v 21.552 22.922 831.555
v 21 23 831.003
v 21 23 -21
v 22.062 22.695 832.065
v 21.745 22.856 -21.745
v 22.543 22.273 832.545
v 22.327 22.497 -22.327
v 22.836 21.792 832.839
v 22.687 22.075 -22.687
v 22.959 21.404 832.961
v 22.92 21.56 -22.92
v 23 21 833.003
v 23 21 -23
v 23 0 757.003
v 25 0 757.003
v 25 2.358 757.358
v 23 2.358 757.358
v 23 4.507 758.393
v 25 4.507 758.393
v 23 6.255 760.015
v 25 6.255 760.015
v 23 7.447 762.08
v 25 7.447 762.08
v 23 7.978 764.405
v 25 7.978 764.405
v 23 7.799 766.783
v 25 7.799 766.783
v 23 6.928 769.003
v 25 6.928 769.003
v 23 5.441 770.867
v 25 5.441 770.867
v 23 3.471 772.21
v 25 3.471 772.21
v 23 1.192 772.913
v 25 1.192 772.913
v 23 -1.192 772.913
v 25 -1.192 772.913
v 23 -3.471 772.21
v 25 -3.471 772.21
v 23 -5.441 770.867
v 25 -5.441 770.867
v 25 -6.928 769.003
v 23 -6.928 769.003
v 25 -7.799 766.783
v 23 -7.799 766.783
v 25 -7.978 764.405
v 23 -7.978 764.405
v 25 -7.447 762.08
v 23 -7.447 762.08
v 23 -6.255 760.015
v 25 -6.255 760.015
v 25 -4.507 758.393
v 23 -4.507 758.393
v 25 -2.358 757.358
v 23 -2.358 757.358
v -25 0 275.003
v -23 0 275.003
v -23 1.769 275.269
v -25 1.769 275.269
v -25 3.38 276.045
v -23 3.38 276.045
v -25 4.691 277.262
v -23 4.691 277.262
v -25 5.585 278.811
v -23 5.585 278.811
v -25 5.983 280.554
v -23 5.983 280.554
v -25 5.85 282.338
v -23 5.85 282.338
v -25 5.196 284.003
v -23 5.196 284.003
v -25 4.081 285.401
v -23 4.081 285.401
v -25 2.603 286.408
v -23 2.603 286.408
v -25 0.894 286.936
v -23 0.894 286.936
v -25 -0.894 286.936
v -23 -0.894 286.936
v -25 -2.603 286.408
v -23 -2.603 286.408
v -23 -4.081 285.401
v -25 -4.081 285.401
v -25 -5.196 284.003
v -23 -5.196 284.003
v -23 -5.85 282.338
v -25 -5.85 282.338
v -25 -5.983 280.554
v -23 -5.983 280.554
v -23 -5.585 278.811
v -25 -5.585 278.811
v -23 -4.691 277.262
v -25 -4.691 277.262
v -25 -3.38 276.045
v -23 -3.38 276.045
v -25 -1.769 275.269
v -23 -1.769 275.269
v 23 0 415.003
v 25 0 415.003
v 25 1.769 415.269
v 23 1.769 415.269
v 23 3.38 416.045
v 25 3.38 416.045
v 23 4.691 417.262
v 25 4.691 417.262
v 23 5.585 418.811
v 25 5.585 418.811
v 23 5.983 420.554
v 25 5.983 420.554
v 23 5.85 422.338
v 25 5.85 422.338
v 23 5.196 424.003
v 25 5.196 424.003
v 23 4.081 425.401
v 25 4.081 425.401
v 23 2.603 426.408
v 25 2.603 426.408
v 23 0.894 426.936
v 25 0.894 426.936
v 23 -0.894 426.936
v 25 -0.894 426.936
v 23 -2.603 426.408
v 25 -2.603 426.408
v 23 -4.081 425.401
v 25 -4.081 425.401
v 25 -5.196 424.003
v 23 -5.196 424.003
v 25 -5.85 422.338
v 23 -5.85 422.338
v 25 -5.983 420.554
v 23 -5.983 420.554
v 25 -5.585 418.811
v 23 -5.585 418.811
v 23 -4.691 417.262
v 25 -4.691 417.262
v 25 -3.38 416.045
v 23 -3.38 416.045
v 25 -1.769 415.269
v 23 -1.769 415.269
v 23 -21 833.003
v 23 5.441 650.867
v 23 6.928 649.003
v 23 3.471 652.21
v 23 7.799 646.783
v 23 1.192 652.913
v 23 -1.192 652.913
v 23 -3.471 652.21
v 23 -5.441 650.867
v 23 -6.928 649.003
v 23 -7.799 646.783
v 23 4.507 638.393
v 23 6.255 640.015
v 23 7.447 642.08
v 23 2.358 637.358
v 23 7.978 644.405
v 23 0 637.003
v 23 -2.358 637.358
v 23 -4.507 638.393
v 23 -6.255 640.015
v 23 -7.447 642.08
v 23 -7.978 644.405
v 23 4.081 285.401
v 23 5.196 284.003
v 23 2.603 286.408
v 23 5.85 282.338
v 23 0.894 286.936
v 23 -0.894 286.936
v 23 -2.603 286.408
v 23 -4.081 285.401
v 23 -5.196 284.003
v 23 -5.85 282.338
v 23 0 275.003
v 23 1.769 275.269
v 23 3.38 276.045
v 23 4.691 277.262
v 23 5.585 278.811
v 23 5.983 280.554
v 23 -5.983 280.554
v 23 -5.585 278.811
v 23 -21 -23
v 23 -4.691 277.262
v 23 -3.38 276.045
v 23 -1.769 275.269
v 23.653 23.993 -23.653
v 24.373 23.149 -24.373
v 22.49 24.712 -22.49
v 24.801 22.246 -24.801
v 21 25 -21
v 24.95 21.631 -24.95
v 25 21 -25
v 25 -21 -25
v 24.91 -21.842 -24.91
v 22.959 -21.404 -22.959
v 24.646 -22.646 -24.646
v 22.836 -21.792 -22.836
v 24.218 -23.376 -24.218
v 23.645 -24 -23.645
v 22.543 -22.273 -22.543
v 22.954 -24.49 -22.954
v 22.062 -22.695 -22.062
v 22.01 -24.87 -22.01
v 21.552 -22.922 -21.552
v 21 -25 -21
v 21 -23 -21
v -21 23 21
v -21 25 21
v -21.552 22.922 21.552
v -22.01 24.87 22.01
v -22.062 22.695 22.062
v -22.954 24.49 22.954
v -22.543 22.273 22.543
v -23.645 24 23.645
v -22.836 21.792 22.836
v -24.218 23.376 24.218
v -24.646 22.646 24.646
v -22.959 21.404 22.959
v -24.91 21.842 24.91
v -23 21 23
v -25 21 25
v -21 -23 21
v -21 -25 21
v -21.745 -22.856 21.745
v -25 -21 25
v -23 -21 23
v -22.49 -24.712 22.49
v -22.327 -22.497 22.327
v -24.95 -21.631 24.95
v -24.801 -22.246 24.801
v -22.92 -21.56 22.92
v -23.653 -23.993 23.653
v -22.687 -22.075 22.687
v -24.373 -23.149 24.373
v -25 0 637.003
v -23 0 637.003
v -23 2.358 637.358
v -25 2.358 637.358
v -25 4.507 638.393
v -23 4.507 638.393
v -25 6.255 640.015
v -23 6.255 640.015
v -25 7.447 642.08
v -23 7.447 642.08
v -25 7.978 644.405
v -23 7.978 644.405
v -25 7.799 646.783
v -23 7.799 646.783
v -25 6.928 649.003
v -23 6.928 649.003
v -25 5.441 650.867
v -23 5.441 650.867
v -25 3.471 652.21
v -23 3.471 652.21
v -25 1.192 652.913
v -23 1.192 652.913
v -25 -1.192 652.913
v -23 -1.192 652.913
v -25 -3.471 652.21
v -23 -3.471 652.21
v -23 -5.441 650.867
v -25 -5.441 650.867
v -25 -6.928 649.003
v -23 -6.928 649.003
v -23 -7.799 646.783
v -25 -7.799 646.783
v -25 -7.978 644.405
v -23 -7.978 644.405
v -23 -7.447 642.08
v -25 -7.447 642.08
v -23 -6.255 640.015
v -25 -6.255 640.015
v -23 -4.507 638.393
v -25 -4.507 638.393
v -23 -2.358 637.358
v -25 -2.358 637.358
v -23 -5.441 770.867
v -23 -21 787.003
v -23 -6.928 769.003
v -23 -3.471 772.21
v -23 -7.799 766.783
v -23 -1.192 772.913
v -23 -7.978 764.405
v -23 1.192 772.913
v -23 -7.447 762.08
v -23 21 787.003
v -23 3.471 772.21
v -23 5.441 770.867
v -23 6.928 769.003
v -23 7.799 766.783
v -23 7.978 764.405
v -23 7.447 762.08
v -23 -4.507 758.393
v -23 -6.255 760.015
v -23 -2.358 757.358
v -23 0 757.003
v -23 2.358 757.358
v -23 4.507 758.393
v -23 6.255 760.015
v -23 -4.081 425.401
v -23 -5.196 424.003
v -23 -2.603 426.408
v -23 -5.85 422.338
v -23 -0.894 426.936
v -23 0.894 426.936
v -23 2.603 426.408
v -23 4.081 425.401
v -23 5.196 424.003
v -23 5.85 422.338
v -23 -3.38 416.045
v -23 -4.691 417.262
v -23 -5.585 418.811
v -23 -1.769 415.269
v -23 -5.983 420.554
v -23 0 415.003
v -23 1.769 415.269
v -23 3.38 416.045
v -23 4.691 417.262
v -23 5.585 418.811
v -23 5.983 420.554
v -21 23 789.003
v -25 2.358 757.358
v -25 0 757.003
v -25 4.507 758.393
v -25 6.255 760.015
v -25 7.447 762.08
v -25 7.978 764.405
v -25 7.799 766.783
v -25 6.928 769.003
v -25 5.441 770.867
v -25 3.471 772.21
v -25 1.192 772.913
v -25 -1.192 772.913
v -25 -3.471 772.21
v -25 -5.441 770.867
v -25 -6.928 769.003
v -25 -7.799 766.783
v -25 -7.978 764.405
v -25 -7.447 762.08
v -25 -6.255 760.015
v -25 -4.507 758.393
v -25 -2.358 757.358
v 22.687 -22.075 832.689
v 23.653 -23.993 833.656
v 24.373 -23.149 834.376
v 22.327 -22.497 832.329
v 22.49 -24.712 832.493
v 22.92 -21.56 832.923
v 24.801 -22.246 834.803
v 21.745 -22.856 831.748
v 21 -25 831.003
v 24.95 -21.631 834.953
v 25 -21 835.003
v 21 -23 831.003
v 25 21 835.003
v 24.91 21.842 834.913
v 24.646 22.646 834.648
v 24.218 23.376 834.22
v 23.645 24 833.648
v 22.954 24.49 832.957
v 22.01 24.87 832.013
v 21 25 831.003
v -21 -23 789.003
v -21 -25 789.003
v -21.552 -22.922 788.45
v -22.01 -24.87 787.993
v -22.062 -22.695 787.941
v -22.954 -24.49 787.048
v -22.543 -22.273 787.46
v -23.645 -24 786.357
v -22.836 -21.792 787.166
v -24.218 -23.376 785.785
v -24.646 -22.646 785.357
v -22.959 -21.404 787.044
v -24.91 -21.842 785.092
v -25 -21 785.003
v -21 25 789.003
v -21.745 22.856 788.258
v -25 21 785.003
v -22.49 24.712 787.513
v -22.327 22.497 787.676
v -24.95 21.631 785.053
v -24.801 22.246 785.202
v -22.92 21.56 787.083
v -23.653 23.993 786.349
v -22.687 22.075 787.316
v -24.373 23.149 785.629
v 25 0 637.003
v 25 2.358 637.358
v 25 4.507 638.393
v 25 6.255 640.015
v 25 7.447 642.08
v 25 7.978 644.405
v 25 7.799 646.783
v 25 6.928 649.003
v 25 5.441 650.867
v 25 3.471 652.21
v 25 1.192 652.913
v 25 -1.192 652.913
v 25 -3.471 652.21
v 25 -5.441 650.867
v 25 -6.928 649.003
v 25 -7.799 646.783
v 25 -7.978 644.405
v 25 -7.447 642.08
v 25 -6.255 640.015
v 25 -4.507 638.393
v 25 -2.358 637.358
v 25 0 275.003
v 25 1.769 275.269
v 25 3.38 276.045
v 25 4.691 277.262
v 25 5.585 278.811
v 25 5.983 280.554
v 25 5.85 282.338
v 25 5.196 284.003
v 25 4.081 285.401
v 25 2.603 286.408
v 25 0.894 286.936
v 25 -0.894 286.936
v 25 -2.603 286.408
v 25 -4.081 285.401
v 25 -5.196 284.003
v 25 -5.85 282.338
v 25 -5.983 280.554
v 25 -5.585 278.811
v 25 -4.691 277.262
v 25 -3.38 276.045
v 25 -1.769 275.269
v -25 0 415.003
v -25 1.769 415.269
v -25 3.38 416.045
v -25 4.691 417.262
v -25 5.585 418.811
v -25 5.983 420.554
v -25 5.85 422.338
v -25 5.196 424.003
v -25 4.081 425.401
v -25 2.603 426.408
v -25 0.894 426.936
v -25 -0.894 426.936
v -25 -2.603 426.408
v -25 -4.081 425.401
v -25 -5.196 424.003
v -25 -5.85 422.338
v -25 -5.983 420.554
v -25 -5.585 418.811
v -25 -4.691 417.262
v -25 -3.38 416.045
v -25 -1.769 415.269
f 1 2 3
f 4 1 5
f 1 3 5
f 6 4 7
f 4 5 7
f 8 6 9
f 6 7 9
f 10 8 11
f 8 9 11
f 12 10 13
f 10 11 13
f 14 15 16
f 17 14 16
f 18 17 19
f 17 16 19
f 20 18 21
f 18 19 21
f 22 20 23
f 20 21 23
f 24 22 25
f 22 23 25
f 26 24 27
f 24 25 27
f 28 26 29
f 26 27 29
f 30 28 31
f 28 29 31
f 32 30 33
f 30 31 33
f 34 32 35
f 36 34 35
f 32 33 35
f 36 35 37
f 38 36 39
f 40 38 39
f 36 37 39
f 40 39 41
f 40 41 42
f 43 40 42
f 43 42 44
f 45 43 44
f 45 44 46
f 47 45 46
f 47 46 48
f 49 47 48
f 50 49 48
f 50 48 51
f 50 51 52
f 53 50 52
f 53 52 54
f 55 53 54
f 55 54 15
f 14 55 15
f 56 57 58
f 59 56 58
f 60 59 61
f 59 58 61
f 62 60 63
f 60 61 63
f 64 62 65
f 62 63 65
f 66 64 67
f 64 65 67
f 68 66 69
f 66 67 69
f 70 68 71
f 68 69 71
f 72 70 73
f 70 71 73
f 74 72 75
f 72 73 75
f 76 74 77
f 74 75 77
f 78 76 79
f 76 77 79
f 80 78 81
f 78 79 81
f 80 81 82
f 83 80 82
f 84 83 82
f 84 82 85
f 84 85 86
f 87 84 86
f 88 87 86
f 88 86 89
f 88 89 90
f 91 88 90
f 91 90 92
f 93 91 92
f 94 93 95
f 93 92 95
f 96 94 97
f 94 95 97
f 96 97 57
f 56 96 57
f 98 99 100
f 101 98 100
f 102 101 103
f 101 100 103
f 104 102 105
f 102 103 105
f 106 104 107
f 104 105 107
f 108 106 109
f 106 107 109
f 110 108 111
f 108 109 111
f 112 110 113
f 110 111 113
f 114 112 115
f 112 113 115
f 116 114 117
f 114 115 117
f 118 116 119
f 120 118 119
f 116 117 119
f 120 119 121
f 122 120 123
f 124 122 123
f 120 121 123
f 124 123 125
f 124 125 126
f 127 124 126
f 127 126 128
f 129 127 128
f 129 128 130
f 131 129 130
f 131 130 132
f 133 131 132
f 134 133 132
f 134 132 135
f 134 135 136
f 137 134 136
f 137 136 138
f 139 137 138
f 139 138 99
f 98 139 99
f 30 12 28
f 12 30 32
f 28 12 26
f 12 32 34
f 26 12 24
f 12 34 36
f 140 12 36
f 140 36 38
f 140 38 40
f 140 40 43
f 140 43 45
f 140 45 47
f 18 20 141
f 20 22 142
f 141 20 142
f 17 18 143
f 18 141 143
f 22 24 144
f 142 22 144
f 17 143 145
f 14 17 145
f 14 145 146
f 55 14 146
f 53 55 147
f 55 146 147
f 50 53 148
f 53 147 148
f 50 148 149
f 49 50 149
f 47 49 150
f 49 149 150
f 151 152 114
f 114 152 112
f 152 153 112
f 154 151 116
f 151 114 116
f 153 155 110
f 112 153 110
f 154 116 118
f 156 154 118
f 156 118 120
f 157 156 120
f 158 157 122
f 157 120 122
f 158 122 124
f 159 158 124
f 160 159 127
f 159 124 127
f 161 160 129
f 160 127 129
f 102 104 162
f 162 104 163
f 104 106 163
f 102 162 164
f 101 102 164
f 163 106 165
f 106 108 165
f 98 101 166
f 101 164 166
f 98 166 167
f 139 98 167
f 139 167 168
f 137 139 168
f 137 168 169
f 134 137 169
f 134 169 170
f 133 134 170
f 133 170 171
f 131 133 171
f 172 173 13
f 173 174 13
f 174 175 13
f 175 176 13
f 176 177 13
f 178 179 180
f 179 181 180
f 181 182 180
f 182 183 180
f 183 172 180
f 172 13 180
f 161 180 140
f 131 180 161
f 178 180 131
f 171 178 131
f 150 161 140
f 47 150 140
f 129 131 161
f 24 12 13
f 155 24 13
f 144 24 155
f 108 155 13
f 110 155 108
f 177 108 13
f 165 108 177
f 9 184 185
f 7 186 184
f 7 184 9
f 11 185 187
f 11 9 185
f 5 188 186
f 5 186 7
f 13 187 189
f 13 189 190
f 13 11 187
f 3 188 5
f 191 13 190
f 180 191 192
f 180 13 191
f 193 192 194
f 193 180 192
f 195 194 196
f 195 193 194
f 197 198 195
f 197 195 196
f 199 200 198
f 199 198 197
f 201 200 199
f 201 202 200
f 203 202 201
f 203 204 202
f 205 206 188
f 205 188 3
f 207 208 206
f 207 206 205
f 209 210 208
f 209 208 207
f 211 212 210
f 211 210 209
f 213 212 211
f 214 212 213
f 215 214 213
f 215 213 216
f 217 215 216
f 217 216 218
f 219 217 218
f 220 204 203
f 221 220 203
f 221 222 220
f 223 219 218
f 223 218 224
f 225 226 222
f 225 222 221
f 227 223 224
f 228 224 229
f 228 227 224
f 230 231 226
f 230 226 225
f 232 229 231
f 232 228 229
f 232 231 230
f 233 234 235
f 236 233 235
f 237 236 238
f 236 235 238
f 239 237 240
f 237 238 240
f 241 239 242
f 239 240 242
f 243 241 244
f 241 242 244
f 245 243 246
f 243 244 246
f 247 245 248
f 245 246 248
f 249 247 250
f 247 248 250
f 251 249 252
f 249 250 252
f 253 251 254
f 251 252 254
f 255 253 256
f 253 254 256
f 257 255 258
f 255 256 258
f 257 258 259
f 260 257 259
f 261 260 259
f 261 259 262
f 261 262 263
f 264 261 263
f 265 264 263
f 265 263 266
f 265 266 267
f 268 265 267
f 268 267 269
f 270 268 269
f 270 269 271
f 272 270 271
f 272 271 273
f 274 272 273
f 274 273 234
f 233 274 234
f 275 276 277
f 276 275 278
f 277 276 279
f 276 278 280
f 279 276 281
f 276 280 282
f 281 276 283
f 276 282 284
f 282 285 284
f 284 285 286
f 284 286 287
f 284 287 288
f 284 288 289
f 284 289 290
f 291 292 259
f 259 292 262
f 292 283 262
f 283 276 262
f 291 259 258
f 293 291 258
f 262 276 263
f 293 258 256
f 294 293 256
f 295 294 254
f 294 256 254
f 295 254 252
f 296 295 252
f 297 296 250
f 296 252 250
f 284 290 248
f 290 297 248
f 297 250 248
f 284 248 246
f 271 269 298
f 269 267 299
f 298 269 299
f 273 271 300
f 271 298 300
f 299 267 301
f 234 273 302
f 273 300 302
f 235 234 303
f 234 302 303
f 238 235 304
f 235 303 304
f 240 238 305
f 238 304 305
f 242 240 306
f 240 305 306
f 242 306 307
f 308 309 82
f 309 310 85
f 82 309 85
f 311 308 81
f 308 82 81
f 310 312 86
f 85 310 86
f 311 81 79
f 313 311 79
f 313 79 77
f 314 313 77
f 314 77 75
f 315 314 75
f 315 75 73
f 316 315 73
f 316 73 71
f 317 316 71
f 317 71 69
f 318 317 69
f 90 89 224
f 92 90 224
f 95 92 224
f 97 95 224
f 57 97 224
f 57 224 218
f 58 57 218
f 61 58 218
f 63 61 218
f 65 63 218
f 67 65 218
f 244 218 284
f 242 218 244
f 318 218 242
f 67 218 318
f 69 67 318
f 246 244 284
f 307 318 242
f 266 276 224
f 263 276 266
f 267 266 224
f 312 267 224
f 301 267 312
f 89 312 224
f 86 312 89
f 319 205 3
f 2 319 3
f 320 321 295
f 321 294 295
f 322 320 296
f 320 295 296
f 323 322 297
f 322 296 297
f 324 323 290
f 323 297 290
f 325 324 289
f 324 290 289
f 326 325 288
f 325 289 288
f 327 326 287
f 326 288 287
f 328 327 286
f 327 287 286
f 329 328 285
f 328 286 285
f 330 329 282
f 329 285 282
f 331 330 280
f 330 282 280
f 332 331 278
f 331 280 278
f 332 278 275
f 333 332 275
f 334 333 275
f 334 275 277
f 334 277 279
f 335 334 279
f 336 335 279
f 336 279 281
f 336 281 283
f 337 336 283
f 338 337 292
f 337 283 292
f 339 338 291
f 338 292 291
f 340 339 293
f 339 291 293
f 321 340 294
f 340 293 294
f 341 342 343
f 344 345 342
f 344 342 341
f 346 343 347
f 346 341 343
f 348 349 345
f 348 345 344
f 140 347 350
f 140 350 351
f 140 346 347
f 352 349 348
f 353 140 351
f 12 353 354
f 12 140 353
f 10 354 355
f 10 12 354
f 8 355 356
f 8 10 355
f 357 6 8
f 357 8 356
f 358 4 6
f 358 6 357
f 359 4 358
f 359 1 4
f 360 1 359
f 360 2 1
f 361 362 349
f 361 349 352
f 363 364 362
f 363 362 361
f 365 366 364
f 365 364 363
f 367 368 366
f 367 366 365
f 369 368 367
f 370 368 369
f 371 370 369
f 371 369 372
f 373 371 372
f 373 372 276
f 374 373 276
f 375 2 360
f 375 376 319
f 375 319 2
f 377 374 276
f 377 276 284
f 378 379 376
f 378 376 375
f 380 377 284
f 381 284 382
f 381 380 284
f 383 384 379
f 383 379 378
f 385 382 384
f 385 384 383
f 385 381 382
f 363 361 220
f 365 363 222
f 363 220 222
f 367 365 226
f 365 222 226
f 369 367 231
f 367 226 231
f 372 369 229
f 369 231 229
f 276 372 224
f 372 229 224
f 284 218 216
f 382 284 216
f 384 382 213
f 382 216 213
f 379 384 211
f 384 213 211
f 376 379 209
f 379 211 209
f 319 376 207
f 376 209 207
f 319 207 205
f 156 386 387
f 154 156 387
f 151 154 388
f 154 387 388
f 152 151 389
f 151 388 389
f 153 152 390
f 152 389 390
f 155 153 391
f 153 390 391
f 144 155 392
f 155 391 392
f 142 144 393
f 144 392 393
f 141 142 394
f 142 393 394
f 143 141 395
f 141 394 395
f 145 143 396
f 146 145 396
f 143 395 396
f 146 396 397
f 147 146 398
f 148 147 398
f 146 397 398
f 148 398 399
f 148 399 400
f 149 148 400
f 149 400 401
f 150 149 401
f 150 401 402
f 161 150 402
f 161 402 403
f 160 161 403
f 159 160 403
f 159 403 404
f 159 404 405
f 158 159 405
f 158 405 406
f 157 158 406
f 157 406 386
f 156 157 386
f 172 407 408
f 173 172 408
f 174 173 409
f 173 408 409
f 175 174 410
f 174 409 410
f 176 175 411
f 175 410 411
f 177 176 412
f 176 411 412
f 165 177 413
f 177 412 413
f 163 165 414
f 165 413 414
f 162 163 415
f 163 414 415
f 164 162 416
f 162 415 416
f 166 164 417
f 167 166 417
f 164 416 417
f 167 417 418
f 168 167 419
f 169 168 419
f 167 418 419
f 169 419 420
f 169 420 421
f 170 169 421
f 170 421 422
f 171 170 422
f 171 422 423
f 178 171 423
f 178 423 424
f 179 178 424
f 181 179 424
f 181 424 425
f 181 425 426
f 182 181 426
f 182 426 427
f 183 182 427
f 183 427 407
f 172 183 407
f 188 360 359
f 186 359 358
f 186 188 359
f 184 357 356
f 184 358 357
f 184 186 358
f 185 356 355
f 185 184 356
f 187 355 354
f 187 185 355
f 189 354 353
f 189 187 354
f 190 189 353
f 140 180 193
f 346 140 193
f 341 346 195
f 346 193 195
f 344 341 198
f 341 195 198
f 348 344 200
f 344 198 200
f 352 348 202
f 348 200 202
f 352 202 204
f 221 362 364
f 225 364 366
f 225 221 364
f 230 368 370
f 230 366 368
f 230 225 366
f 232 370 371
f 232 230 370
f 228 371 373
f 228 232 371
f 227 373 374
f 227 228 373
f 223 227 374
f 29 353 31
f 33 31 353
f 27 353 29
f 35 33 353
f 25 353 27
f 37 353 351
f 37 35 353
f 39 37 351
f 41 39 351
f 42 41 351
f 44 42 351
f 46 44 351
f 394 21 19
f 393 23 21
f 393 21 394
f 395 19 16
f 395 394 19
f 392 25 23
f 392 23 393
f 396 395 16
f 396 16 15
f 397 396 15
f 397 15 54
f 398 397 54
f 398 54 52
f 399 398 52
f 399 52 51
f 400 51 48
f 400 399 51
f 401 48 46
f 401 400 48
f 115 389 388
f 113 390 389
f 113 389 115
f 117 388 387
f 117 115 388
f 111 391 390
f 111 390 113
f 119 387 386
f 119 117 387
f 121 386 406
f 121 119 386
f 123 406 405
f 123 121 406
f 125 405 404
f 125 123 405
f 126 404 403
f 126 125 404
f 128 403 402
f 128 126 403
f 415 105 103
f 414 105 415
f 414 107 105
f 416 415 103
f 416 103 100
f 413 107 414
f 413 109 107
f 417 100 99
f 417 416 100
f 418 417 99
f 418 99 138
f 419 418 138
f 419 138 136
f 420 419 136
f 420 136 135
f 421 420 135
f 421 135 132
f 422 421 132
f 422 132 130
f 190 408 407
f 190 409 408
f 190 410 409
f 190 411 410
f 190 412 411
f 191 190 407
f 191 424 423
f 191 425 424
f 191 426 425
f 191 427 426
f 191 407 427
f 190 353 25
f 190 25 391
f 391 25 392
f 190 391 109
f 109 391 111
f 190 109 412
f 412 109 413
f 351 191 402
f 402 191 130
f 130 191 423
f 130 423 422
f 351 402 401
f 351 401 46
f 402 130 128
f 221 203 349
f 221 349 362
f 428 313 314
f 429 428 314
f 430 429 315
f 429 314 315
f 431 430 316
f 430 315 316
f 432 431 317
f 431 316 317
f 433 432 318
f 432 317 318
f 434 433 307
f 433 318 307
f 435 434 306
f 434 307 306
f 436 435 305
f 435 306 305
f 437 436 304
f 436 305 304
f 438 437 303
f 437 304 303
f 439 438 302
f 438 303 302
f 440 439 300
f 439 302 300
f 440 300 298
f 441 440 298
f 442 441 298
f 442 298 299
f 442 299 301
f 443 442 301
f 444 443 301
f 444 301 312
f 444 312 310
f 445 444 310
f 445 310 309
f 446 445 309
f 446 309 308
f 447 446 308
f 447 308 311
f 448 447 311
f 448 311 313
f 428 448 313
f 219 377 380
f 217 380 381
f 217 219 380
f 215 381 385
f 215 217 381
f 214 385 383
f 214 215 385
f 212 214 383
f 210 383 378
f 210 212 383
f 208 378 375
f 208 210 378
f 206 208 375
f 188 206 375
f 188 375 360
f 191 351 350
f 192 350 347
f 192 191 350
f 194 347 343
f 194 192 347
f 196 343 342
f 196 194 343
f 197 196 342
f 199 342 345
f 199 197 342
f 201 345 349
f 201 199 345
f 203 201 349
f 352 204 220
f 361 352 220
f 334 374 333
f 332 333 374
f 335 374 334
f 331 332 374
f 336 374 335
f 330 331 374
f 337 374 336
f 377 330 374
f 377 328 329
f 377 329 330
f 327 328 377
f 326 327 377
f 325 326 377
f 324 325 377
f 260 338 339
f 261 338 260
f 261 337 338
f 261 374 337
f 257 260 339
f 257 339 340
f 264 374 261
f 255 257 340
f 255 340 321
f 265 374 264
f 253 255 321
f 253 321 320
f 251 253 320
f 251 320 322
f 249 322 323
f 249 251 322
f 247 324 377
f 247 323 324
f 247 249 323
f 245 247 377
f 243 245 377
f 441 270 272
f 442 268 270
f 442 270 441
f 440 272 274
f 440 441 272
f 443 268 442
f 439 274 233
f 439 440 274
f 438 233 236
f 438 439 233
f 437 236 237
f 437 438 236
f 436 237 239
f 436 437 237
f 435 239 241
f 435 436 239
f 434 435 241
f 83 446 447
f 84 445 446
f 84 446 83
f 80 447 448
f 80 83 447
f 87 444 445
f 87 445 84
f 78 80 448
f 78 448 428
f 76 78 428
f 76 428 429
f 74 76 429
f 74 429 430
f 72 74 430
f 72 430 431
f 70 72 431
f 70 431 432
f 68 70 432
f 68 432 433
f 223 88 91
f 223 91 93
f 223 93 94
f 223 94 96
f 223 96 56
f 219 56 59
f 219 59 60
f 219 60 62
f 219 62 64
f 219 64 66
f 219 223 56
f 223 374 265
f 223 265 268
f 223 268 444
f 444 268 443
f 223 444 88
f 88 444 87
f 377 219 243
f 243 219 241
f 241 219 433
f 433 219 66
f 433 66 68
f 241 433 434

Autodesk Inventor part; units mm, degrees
ref_plane "Start Plane" through (0, 0, -25) normal (0, 0, 1) x (1, 0, 0)
ref_plane "End Plane" through (0, 0, 835.0026) normal (0, 0, 1) x (1, 0, 0)
sketch "Sketch" plane through (0, 0, 0) normal (0, 0, 1) x (1, 0, 0)
  line L0 (-25, -21) -> (-25, 21)
  line L1 (-21, 25) -> (21, 25)
  line L2 (25, 21) -> (25, -21)
  line L3 (21, -25) -> (-21, -25)
  arc A0 (-25, -21) -> (-21, -25) centre (-21, -21) ccw
  arc A1 (25, 21) -> (21, 25) centre (21, 21) ccw
  arc A2 (-21, 25) -> (-25, 21) centre (-21, 21) ccw
  arc A3 (21, -25) -> (25, -21) centre (21, -21) ccw
  arc A4 (-21, 23) -> (-23, 21) centre (-21, 21) ccw
  line L4 (-21, 23) -> (21, 23)
  arc A5 (23, 21) -> (21, 23) centre (21, 21) ccw
  line L5 (23, 21) -> (23, -21)
  arc A6 (21, -23) -> (23, -21) centre (21, -21) ccw
  line L6 (21, -23) -> (-21, -23)
  arc A7 (-23, -21) -> (-21, -23) centre (-21, -21) ccw
  line L7 (-23, -21) -> (-23, 21)
  line L8 (0, 36.1598) -> (0, -36.1598) construction
  line L9 (-36.1598, 0) -> (36.1598, 0) construction
  dimension "d7" = 4
  dimension "d9" = 50
  dimension "d11" = 50
  dimension "d12" = 2
  dimension "d15" = 25
  dimension "d16" = 25
extrude "Body" add sketch "Sketch" along normal up to surface (860.0026 mm away) from surface at -25
sketch "Sketch3" plane through (0, 0, 0) normal (0, 0, 1) x (1, 0, 0)
  line L0 (0, 0) -> (10, 0)
ref_plane "Work Plane3" through (0, 0, 0) normal (0, -1, 0) x (1, 0, 0)
sketch "Sketch4" plane through (0, 0, 0) normal (0, -1, 0) x (1, 0, 0)
  line L0 (-2, -25) -> (12, -25)
  line L1 (-2, 835.0026) -> (12, 835.0026)
  dimension "d18" = 860.0026
ref_plane "Work Plane4" through (25, 0, 835.0026) normal (-0.7071, 0, 0.7071) x (0.7071, 0, 0.7071)
split "Split1" plane through (25, 0, 835.0026) removes the side toward (-0.7071, 0, 0.7071)
ref_plane "Work Plane5" through (25, 0, -25) normal (-0.7071, 0, -0.7071) x (-0.7071, 0, 0.7071)
split "Split2" plane through (25, 0, -25) removes the side toward (-0.7071, 0, -0.7071)
sketch "Sketch5" plane through (25, -21, 835.0026) normal (1, 0, 0) x (0, 0, -1)
  circle A0 centre (554, 21) radius 6 projected
  circle A1 centre (414, 21) radius 6 projected
  circle A2 centre (190, 21) radius 8 projected
  circle A3 centre (70, 21) radius 8 projected
  point P0 (835.0026, 21)
extrude "Extrusion2" cut sketch "Sketch5" against normal up to surface (50 mm away)
equation "\"d7\" = G_IR"
equation "\"d9\" = G_W"
equation "\"d11\" = G_H"
equation "\"d12\" = G_T"
equation "\"d15\" = 0.5 * d9"
equation "\"d16\" = 0.5 * d11"
equation "\"d3\" = G_L"
equation "\"G_W\" = 50"
equation "\"G_H\" = 50"
equation "\"G_T\" = 2"
equation "\"G_IR\" = 4"
equation "\"G_L\" = d18"
equation "\"G_OFFSET_START\" = 25"
equation "\"G_OFFSET_END\" = 25"
equation "\"d13\" = -G_OFFSET_START"
equation "\"d14\" = G_OFFSET_END + B_L"
equation "\"B_L\" = 810.0026"
properties part number "ISO 10799-2 - 50x50x2 - 860"
